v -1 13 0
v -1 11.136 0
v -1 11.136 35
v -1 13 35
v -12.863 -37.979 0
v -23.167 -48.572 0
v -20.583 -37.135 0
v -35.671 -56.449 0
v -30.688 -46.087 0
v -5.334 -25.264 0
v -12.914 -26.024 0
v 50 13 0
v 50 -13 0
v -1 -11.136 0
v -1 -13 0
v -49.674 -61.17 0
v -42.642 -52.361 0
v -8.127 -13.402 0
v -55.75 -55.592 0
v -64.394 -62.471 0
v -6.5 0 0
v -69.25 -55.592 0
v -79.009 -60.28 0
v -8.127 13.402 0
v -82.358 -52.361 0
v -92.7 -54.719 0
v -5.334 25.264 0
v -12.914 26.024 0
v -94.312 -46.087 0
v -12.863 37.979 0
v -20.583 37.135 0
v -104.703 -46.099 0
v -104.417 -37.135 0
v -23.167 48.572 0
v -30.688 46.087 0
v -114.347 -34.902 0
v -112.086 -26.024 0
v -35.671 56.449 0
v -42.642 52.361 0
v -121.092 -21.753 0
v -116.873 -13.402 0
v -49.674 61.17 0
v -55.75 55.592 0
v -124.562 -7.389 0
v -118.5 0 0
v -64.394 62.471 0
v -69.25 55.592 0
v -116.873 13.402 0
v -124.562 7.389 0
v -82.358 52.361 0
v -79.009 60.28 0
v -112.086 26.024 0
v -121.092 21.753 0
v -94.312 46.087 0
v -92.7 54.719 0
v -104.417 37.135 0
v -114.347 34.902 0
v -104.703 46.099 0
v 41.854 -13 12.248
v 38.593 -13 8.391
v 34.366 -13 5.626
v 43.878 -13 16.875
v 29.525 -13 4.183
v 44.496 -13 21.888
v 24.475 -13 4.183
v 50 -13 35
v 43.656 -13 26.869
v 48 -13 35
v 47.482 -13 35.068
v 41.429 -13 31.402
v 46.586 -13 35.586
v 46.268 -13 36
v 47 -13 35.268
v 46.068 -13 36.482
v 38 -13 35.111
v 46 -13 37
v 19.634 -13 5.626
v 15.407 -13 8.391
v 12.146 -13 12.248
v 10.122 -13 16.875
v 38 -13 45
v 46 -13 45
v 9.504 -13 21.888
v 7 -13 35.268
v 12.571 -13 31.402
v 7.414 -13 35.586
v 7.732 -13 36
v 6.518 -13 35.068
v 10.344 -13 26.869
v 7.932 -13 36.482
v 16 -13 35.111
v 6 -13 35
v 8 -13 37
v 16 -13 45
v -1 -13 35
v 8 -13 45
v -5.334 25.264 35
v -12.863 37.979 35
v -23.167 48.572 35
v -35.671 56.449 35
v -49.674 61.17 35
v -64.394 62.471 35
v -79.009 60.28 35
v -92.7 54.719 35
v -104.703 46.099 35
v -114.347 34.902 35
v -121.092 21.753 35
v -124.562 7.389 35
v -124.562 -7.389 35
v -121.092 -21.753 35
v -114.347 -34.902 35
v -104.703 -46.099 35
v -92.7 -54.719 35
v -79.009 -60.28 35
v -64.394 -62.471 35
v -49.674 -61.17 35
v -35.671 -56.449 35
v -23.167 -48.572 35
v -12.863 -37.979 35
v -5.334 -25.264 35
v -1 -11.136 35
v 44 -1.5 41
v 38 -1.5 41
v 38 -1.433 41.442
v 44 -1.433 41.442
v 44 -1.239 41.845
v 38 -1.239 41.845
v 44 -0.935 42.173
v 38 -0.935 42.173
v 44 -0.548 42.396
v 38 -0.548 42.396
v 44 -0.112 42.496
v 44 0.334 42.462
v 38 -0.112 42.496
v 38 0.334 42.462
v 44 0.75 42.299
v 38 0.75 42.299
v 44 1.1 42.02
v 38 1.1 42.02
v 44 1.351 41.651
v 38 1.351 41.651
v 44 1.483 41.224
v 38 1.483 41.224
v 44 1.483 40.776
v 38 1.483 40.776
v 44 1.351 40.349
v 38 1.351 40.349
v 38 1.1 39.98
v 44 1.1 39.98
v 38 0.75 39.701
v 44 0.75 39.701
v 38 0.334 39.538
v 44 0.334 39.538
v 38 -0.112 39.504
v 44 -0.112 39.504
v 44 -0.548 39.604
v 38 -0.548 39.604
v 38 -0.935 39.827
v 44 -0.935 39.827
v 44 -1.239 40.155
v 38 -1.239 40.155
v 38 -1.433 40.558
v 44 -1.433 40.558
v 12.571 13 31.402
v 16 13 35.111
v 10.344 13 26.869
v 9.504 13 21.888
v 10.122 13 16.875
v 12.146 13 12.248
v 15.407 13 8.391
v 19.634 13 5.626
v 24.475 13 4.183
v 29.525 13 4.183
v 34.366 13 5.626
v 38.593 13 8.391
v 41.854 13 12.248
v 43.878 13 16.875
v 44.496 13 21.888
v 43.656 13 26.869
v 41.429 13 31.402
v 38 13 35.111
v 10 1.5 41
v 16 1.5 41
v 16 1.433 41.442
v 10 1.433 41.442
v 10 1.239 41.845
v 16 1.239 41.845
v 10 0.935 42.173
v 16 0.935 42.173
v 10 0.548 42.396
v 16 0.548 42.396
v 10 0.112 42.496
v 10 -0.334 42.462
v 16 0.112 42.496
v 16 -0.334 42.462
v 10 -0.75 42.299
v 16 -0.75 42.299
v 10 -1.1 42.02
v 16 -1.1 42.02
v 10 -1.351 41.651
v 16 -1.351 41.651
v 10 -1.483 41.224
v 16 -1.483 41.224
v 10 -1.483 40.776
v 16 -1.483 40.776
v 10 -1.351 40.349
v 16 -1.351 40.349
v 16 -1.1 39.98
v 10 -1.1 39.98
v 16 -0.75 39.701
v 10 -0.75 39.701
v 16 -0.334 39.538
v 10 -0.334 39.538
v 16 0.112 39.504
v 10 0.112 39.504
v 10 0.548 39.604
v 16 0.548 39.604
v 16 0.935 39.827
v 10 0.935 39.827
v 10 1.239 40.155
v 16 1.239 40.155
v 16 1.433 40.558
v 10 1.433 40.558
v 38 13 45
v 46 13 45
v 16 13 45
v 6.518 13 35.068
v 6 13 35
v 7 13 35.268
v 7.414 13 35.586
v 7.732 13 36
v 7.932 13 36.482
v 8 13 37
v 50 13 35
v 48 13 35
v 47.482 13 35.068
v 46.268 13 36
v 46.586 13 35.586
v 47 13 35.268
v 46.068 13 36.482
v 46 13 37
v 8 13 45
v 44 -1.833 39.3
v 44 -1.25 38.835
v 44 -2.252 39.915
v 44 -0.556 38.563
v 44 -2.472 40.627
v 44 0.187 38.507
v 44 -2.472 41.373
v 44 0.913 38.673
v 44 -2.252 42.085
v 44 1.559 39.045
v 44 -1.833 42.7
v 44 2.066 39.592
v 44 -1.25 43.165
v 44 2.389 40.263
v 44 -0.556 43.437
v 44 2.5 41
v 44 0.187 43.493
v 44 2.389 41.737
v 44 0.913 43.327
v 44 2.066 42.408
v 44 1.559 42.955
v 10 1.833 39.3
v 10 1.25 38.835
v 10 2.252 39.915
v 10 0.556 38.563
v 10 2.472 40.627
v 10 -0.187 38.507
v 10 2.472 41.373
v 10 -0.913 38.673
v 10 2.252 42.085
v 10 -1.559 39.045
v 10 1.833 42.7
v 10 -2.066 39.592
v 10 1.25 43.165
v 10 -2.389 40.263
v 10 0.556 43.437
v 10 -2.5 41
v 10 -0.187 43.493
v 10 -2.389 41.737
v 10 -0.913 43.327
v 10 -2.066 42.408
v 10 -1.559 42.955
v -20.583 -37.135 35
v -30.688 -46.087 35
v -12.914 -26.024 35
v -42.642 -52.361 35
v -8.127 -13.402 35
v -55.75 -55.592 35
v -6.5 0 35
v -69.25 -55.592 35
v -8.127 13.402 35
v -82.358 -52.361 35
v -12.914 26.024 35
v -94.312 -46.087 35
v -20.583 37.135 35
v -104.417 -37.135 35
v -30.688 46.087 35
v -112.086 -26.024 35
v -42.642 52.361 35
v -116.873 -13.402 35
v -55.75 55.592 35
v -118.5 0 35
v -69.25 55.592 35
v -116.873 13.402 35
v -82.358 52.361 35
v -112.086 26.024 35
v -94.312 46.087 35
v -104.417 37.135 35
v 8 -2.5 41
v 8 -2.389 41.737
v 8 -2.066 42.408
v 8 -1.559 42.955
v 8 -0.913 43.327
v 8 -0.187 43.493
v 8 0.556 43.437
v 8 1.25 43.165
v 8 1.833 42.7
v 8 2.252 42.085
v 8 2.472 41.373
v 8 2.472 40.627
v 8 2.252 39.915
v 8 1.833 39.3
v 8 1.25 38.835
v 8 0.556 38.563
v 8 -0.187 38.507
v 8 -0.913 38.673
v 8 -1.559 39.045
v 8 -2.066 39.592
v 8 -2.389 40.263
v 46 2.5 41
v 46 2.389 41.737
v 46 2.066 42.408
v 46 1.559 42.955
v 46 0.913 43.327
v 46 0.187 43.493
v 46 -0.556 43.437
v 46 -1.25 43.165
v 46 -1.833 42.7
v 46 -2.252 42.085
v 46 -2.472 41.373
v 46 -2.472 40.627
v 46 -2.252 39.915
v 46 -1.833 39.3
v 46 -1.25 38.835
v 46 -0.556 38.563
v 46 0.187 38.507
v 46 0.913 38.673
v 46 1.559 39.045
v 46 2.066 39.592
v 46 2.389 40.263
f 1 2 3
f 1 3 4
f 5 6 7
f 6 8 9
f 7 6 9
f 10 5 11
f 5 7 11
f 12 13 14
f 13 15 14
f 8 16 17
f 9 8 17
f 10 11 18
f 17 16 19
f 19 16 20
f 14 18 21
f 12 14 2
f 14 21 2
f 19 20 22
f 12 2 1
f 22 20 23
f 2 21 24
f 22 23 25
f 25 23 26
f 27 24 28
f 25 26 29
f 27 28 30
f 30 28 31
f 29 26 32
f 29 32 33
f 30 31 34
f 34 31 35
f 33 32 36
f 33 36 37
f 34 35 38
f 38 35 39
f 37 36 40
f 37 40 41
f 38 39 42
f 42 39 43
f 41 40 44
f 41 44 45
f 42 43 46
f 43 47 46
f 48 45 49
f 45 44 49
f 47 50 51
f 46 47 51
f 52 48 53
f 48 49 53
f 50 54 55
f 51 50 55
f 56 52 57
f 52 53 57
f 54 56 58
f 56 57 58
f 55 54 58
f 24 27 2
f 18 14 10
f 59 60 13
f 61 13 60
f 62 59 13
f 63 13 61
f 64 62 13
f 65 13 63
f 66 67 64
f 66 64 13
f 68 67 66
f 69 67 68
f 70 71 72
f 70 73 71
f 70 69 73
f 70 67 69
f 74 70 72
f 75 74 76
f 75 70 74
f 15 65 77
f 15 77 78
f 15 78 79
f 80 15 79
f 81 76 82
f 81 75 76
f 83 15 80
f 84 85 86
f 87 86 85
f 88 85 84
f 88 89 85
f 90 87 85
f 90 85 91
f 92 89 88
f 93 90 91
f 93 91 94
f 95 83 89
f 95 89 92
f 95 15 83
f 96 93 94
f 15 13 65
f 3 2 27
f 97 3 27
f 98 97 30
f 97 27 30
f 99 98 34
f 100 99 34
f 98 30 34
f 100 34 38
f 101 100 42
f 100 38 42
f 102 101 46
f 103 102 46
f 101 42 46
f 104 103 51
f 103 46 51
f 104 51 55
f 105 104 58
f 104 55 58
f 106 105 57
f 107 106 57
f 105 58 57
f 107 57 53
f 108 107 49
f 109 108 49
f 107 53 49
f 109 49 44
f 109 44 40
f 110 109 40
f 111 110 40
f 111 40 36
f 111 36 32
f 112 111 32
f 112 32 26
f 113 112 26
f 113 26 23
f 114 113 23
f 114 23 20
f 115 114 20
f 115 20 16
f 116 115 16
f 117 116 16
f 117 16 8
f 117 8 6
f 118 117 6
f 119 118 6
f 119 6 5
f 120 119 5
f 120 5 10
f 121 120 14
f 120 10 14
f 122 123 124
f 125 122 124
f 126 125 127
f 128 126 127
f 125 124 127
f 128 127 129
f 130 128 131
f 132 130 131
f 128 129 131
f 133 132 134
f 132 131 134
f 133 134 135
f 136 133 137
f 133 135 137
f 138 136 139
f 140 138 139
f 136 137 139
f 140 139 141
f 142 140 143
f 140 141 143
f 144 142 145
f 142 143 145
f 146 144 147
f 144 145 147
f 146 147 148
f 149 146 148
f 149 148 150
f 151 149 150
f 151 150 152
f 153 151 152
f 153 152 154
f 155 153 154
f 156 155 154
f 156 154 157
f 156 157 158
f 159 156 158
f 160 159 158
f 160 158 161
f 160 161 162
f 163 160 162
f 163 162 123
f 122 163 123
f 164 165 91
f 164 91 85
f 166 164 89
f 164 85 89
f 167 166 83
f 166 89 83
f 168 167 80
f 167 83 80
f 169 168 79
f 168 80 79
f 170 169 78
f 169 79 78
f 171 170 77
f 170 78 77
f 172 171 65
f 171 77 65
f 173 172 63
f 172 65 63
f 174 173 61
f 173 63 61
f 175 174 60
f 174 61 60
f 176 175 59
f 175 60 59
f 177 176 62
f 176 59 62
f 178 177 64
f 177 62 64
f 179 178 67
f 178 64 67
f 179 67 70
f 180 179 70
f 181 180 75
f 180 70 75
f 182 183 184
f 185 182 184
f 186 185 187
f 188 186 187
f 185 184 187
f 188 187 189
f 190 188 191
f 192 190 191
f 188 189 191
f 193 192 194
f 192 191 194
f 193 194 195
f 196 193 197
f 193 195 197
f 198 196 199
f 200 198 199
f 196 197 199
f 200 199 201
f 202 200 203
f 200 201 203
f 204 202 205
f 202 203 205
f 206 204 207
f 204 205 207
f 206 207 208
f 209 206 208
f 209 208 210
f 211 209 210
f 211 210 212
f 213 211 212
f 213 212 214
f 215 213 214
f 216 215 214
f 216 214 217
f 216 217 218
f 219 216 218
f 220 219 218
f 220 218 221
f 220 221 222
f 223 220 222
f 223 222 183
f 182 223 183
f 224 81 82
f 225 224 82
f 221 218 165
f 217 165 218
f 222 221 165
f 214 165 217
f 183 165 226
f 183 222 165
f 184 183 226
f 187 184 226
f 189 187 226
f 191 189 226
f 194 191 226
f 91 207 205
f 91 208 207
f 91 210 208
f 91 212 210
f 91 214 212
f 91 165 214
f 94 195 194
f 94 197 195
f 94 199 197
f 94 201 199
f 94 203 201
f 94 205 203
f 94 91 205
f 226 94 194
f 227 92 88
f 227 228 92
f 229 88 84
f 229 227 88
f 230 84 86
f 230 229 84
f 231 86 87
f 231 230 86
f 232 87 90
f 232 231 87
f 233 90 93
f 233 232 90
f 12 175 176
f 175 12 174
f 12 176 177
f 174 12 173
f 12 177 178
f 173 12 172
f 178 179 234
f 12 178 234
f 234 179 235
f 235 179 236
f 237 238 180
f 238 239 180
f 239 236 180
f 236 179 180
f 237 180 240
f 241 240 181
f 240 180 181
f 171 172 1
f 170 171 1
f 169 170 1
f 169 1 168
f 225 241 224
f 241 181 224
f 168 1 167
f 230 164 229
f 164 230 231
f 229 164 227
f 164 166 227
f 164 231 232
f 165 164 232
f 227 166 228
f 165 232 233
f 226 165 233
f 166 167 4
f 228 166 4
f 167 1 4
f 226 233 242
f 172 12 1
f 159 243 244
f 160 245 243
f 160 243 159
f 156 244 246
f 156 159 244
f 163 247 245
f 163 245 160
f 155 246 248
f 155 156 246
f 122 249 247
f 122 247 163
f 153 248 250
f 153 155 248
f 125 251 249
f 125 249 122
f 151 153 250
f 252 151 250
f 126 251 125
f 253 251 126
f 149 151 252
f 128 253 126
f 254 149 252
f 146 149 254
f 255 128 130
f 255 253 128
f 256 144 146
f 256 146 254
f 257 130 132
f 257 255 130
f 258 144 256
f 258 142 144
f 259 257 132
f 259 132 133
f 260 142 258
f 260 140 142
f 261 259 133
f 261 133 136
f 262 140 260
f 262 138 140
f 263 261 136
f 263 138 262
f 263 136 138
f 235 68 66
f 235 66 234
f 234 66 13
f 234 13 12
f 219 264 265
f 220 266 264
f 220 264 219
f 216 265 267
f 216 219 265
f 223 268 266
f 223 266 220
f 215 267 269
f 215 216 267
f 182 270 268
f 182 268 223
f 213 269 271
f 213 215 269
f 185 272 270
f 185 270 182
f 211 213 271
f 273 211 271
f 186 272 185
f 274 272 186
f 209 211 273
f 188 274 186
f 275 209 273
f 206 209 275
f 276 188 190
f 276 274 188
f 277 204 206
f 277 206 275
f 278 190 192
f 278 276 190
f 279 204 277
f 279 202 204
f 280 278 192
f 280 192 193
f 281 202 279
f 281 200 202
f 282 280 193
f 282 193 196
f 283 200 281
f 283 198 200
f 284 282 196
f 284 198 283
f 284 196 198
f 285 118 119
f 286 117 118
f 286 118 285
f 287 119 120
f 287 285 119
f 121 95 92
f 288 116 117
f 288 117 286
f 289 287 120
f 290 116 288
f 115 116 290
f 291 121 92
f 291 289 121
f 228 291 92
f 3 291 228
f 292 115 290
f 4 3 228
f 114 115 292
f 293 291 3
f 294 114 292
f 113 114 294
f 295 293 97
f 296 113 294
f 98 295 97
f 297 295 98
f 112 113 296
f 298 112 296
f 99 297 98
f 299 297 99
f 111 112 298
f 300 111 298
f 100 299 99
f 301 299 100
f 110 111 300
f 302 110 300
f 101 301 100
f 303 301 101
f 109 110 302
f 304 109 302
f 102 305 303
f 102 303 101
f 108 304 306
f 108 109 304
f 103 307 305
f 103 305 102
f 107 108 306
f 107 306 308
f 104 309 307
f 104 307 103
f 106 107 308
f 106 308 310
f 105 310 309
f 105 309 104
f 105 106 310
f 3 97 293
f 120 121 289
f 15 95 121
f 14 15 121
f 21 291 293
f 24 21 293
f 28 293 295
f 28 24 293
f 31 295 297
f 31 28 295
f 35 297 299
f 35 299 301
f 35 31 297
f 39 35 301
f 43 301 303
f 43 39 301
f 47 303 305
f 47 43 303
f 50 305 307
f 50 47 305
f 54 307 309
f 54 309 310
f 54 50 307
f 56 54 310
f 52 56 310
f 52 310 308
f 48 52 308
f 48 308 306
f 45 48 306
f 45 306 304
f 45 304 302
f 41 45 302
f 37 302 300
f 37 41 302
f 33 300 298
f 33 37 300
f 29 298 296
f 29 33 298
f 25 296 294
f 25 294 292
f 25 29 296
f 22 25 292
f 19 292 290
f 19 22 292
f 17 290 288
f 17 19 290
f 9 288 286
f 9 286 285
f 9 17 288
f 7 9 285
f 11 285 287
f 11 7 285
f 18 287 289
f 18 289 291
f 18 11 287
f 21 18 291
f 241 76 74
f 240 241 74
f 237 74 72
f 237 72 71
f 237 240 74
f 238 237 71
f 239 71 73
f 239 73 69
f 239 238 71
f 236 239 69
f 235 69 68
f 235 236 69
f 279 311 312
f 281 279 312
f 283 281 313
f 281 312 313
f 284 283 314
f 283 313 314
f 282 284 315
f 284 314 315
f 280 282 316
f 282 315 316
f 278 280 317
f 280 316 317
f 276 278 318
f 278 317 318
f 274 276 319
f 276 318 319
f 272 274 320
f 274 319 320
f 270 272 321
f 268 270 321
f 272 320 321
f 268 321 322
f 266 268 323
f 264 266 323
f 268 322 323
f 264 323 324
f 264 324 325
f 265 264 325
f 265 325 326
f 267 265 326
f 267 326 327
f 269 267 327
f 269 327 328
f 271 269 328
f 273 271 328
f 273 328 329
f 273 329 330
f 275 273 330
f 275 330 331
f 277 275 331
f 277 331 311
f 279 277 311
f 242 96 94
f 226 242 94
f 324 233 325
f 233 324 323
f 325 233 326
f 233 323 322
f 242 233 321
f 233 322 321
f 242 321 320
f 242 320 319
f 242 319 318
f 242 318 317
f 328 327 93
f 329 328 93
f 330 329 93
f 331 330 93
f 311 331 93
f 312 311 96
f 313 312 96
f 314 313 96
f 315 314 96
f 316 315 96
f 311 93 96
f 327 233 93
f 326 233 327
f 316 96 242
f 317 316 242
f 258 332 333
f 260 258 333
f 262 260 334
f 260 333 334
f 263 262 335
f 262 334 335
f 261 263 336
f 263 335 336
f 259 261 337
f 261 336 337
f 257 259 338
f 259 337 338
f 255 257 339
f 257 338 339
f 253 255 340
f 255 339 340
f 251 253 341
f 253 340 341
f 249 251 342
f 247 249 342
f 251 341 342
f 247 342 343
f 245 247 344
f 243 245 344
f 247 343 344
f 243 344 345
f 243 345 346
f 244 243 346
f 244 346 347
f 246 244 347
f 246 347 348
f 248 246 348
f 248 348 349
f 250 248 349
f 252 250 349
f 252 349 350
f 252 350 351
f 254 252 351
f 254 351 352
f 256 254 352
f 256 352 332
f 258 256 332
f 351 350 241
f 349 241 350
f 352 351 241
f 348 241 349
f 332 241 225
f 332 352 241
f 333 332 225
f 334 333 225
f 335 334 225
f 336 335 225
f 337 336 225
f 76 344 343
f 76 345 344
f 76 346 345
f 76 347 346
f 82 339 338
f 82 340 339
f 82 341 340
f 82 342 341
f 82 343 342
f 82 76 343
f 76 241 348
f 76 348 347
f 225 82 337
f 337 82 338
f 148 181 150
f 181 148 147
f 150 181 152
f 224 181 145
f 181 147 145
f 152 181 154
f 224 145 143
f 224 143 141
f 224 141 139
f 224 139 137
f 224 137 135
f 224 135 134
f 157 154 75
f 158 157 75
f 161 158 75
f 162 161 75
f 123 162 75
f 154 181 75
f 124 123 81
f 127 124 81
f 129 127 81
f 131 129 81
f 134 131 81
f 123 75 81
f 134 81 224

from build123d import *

# Parameters (mm, degrees)
F0_R            = 56
F0_R_2          = 62.5
F1_DEPTH        = 35
F3_DEPTH        = 1
F4_W            = 26
F4_H            = 35
F5_DEPTH        = 50
F6_W            = 8
F6_H            = 10
F7_DEPTH        = 26
F8_R            = 17.5
F9_DEPTH        = 50
F10_R           = 2
F12_D           = 3
F12_DEPTH       = 8
F12_CBORE_D     = 5
F12_CBORE_DEPTH = 2
F14_D           = 3
F14_DEPTH       = 8
F14_CBORE_D     = 5
F14_CBORE_DEPTH = 2


with BuildPart() as f1:
    # F0 (on Top) → F1 (new body)
    with BuildSketch(Plane.XY):
        with Locations((-62.5, 0)):
            Circle(F0_R)
        with Locations((-62.5, 0)):
            Circle(F0_R_2)
        with Locations((-62.5, 0)):
            Circle(F0_R, mode=Mode.SUBTRACT)
    extrude(amount=F1_DEPTH)

    # F2 (on Right) → F3 (join)
    with BuildSketch(Plane.YZ):
        Polygon((-13, 0), (0, 0), (13, 0), (13, 35), (-13, 35), align=None)
    extrude(amount=-F3_DEPTH)

    # F4 (on face) → F5 (join)
    with BuildSketch(Plane.YZ):
        with Locations((0, 17.5)):
            Rectangle(F4_W, F4_H)
    extrude(amount=F5_DEPTH)

    # F6 (on face) → F7 (join)
    with BuildSketch(Plane.XZ.offset(13)):
        with Locations((42, 40)):
            Rectangle(F6_W, F6_H)
        with Locations((12, 40)):
            Rectangle(F6_W, F6_H)
    extrude(amount=-F7_DEPTH)

    # F8 (on face) → F9 (cut)
    with BuildSketch(Plane.XZ.offset(13)):
        with Locations((27, 21.5)):
            Circle(F8_R)
    extrude(amount=-F9_DEPTH, mode=Mode.SUBTRACT)

    # F10
    f10_edges = [f1.edges().sort_by_distance(p)[0] for p in [
        (46, 0, 35),
        (8, 0, 35),
    ]]
    fillet(f10_edges, radius=F10_R)

    # F12
    with Locations(Plane.YZ.offset(46)):
        with Locations((0, 41)):
            CounterBoreHole(F12_D / 2, F12_CBORE_D / 2, F12_CBORE_DEPTH, depth=F12_DEPTH)

    # F14
    with Locations(Plane(origin=(8, 0, 0), x_dir=(0, -1, 0), z_dir=(-1, 0, 0))):
        with Locations((0, 41)):
            CounterBoreHole(F14_D / 2, F14_CBORE_D / 2, F14_CBORE_DEPTH, depth=F14_DEPTH)


solid = f1.part
